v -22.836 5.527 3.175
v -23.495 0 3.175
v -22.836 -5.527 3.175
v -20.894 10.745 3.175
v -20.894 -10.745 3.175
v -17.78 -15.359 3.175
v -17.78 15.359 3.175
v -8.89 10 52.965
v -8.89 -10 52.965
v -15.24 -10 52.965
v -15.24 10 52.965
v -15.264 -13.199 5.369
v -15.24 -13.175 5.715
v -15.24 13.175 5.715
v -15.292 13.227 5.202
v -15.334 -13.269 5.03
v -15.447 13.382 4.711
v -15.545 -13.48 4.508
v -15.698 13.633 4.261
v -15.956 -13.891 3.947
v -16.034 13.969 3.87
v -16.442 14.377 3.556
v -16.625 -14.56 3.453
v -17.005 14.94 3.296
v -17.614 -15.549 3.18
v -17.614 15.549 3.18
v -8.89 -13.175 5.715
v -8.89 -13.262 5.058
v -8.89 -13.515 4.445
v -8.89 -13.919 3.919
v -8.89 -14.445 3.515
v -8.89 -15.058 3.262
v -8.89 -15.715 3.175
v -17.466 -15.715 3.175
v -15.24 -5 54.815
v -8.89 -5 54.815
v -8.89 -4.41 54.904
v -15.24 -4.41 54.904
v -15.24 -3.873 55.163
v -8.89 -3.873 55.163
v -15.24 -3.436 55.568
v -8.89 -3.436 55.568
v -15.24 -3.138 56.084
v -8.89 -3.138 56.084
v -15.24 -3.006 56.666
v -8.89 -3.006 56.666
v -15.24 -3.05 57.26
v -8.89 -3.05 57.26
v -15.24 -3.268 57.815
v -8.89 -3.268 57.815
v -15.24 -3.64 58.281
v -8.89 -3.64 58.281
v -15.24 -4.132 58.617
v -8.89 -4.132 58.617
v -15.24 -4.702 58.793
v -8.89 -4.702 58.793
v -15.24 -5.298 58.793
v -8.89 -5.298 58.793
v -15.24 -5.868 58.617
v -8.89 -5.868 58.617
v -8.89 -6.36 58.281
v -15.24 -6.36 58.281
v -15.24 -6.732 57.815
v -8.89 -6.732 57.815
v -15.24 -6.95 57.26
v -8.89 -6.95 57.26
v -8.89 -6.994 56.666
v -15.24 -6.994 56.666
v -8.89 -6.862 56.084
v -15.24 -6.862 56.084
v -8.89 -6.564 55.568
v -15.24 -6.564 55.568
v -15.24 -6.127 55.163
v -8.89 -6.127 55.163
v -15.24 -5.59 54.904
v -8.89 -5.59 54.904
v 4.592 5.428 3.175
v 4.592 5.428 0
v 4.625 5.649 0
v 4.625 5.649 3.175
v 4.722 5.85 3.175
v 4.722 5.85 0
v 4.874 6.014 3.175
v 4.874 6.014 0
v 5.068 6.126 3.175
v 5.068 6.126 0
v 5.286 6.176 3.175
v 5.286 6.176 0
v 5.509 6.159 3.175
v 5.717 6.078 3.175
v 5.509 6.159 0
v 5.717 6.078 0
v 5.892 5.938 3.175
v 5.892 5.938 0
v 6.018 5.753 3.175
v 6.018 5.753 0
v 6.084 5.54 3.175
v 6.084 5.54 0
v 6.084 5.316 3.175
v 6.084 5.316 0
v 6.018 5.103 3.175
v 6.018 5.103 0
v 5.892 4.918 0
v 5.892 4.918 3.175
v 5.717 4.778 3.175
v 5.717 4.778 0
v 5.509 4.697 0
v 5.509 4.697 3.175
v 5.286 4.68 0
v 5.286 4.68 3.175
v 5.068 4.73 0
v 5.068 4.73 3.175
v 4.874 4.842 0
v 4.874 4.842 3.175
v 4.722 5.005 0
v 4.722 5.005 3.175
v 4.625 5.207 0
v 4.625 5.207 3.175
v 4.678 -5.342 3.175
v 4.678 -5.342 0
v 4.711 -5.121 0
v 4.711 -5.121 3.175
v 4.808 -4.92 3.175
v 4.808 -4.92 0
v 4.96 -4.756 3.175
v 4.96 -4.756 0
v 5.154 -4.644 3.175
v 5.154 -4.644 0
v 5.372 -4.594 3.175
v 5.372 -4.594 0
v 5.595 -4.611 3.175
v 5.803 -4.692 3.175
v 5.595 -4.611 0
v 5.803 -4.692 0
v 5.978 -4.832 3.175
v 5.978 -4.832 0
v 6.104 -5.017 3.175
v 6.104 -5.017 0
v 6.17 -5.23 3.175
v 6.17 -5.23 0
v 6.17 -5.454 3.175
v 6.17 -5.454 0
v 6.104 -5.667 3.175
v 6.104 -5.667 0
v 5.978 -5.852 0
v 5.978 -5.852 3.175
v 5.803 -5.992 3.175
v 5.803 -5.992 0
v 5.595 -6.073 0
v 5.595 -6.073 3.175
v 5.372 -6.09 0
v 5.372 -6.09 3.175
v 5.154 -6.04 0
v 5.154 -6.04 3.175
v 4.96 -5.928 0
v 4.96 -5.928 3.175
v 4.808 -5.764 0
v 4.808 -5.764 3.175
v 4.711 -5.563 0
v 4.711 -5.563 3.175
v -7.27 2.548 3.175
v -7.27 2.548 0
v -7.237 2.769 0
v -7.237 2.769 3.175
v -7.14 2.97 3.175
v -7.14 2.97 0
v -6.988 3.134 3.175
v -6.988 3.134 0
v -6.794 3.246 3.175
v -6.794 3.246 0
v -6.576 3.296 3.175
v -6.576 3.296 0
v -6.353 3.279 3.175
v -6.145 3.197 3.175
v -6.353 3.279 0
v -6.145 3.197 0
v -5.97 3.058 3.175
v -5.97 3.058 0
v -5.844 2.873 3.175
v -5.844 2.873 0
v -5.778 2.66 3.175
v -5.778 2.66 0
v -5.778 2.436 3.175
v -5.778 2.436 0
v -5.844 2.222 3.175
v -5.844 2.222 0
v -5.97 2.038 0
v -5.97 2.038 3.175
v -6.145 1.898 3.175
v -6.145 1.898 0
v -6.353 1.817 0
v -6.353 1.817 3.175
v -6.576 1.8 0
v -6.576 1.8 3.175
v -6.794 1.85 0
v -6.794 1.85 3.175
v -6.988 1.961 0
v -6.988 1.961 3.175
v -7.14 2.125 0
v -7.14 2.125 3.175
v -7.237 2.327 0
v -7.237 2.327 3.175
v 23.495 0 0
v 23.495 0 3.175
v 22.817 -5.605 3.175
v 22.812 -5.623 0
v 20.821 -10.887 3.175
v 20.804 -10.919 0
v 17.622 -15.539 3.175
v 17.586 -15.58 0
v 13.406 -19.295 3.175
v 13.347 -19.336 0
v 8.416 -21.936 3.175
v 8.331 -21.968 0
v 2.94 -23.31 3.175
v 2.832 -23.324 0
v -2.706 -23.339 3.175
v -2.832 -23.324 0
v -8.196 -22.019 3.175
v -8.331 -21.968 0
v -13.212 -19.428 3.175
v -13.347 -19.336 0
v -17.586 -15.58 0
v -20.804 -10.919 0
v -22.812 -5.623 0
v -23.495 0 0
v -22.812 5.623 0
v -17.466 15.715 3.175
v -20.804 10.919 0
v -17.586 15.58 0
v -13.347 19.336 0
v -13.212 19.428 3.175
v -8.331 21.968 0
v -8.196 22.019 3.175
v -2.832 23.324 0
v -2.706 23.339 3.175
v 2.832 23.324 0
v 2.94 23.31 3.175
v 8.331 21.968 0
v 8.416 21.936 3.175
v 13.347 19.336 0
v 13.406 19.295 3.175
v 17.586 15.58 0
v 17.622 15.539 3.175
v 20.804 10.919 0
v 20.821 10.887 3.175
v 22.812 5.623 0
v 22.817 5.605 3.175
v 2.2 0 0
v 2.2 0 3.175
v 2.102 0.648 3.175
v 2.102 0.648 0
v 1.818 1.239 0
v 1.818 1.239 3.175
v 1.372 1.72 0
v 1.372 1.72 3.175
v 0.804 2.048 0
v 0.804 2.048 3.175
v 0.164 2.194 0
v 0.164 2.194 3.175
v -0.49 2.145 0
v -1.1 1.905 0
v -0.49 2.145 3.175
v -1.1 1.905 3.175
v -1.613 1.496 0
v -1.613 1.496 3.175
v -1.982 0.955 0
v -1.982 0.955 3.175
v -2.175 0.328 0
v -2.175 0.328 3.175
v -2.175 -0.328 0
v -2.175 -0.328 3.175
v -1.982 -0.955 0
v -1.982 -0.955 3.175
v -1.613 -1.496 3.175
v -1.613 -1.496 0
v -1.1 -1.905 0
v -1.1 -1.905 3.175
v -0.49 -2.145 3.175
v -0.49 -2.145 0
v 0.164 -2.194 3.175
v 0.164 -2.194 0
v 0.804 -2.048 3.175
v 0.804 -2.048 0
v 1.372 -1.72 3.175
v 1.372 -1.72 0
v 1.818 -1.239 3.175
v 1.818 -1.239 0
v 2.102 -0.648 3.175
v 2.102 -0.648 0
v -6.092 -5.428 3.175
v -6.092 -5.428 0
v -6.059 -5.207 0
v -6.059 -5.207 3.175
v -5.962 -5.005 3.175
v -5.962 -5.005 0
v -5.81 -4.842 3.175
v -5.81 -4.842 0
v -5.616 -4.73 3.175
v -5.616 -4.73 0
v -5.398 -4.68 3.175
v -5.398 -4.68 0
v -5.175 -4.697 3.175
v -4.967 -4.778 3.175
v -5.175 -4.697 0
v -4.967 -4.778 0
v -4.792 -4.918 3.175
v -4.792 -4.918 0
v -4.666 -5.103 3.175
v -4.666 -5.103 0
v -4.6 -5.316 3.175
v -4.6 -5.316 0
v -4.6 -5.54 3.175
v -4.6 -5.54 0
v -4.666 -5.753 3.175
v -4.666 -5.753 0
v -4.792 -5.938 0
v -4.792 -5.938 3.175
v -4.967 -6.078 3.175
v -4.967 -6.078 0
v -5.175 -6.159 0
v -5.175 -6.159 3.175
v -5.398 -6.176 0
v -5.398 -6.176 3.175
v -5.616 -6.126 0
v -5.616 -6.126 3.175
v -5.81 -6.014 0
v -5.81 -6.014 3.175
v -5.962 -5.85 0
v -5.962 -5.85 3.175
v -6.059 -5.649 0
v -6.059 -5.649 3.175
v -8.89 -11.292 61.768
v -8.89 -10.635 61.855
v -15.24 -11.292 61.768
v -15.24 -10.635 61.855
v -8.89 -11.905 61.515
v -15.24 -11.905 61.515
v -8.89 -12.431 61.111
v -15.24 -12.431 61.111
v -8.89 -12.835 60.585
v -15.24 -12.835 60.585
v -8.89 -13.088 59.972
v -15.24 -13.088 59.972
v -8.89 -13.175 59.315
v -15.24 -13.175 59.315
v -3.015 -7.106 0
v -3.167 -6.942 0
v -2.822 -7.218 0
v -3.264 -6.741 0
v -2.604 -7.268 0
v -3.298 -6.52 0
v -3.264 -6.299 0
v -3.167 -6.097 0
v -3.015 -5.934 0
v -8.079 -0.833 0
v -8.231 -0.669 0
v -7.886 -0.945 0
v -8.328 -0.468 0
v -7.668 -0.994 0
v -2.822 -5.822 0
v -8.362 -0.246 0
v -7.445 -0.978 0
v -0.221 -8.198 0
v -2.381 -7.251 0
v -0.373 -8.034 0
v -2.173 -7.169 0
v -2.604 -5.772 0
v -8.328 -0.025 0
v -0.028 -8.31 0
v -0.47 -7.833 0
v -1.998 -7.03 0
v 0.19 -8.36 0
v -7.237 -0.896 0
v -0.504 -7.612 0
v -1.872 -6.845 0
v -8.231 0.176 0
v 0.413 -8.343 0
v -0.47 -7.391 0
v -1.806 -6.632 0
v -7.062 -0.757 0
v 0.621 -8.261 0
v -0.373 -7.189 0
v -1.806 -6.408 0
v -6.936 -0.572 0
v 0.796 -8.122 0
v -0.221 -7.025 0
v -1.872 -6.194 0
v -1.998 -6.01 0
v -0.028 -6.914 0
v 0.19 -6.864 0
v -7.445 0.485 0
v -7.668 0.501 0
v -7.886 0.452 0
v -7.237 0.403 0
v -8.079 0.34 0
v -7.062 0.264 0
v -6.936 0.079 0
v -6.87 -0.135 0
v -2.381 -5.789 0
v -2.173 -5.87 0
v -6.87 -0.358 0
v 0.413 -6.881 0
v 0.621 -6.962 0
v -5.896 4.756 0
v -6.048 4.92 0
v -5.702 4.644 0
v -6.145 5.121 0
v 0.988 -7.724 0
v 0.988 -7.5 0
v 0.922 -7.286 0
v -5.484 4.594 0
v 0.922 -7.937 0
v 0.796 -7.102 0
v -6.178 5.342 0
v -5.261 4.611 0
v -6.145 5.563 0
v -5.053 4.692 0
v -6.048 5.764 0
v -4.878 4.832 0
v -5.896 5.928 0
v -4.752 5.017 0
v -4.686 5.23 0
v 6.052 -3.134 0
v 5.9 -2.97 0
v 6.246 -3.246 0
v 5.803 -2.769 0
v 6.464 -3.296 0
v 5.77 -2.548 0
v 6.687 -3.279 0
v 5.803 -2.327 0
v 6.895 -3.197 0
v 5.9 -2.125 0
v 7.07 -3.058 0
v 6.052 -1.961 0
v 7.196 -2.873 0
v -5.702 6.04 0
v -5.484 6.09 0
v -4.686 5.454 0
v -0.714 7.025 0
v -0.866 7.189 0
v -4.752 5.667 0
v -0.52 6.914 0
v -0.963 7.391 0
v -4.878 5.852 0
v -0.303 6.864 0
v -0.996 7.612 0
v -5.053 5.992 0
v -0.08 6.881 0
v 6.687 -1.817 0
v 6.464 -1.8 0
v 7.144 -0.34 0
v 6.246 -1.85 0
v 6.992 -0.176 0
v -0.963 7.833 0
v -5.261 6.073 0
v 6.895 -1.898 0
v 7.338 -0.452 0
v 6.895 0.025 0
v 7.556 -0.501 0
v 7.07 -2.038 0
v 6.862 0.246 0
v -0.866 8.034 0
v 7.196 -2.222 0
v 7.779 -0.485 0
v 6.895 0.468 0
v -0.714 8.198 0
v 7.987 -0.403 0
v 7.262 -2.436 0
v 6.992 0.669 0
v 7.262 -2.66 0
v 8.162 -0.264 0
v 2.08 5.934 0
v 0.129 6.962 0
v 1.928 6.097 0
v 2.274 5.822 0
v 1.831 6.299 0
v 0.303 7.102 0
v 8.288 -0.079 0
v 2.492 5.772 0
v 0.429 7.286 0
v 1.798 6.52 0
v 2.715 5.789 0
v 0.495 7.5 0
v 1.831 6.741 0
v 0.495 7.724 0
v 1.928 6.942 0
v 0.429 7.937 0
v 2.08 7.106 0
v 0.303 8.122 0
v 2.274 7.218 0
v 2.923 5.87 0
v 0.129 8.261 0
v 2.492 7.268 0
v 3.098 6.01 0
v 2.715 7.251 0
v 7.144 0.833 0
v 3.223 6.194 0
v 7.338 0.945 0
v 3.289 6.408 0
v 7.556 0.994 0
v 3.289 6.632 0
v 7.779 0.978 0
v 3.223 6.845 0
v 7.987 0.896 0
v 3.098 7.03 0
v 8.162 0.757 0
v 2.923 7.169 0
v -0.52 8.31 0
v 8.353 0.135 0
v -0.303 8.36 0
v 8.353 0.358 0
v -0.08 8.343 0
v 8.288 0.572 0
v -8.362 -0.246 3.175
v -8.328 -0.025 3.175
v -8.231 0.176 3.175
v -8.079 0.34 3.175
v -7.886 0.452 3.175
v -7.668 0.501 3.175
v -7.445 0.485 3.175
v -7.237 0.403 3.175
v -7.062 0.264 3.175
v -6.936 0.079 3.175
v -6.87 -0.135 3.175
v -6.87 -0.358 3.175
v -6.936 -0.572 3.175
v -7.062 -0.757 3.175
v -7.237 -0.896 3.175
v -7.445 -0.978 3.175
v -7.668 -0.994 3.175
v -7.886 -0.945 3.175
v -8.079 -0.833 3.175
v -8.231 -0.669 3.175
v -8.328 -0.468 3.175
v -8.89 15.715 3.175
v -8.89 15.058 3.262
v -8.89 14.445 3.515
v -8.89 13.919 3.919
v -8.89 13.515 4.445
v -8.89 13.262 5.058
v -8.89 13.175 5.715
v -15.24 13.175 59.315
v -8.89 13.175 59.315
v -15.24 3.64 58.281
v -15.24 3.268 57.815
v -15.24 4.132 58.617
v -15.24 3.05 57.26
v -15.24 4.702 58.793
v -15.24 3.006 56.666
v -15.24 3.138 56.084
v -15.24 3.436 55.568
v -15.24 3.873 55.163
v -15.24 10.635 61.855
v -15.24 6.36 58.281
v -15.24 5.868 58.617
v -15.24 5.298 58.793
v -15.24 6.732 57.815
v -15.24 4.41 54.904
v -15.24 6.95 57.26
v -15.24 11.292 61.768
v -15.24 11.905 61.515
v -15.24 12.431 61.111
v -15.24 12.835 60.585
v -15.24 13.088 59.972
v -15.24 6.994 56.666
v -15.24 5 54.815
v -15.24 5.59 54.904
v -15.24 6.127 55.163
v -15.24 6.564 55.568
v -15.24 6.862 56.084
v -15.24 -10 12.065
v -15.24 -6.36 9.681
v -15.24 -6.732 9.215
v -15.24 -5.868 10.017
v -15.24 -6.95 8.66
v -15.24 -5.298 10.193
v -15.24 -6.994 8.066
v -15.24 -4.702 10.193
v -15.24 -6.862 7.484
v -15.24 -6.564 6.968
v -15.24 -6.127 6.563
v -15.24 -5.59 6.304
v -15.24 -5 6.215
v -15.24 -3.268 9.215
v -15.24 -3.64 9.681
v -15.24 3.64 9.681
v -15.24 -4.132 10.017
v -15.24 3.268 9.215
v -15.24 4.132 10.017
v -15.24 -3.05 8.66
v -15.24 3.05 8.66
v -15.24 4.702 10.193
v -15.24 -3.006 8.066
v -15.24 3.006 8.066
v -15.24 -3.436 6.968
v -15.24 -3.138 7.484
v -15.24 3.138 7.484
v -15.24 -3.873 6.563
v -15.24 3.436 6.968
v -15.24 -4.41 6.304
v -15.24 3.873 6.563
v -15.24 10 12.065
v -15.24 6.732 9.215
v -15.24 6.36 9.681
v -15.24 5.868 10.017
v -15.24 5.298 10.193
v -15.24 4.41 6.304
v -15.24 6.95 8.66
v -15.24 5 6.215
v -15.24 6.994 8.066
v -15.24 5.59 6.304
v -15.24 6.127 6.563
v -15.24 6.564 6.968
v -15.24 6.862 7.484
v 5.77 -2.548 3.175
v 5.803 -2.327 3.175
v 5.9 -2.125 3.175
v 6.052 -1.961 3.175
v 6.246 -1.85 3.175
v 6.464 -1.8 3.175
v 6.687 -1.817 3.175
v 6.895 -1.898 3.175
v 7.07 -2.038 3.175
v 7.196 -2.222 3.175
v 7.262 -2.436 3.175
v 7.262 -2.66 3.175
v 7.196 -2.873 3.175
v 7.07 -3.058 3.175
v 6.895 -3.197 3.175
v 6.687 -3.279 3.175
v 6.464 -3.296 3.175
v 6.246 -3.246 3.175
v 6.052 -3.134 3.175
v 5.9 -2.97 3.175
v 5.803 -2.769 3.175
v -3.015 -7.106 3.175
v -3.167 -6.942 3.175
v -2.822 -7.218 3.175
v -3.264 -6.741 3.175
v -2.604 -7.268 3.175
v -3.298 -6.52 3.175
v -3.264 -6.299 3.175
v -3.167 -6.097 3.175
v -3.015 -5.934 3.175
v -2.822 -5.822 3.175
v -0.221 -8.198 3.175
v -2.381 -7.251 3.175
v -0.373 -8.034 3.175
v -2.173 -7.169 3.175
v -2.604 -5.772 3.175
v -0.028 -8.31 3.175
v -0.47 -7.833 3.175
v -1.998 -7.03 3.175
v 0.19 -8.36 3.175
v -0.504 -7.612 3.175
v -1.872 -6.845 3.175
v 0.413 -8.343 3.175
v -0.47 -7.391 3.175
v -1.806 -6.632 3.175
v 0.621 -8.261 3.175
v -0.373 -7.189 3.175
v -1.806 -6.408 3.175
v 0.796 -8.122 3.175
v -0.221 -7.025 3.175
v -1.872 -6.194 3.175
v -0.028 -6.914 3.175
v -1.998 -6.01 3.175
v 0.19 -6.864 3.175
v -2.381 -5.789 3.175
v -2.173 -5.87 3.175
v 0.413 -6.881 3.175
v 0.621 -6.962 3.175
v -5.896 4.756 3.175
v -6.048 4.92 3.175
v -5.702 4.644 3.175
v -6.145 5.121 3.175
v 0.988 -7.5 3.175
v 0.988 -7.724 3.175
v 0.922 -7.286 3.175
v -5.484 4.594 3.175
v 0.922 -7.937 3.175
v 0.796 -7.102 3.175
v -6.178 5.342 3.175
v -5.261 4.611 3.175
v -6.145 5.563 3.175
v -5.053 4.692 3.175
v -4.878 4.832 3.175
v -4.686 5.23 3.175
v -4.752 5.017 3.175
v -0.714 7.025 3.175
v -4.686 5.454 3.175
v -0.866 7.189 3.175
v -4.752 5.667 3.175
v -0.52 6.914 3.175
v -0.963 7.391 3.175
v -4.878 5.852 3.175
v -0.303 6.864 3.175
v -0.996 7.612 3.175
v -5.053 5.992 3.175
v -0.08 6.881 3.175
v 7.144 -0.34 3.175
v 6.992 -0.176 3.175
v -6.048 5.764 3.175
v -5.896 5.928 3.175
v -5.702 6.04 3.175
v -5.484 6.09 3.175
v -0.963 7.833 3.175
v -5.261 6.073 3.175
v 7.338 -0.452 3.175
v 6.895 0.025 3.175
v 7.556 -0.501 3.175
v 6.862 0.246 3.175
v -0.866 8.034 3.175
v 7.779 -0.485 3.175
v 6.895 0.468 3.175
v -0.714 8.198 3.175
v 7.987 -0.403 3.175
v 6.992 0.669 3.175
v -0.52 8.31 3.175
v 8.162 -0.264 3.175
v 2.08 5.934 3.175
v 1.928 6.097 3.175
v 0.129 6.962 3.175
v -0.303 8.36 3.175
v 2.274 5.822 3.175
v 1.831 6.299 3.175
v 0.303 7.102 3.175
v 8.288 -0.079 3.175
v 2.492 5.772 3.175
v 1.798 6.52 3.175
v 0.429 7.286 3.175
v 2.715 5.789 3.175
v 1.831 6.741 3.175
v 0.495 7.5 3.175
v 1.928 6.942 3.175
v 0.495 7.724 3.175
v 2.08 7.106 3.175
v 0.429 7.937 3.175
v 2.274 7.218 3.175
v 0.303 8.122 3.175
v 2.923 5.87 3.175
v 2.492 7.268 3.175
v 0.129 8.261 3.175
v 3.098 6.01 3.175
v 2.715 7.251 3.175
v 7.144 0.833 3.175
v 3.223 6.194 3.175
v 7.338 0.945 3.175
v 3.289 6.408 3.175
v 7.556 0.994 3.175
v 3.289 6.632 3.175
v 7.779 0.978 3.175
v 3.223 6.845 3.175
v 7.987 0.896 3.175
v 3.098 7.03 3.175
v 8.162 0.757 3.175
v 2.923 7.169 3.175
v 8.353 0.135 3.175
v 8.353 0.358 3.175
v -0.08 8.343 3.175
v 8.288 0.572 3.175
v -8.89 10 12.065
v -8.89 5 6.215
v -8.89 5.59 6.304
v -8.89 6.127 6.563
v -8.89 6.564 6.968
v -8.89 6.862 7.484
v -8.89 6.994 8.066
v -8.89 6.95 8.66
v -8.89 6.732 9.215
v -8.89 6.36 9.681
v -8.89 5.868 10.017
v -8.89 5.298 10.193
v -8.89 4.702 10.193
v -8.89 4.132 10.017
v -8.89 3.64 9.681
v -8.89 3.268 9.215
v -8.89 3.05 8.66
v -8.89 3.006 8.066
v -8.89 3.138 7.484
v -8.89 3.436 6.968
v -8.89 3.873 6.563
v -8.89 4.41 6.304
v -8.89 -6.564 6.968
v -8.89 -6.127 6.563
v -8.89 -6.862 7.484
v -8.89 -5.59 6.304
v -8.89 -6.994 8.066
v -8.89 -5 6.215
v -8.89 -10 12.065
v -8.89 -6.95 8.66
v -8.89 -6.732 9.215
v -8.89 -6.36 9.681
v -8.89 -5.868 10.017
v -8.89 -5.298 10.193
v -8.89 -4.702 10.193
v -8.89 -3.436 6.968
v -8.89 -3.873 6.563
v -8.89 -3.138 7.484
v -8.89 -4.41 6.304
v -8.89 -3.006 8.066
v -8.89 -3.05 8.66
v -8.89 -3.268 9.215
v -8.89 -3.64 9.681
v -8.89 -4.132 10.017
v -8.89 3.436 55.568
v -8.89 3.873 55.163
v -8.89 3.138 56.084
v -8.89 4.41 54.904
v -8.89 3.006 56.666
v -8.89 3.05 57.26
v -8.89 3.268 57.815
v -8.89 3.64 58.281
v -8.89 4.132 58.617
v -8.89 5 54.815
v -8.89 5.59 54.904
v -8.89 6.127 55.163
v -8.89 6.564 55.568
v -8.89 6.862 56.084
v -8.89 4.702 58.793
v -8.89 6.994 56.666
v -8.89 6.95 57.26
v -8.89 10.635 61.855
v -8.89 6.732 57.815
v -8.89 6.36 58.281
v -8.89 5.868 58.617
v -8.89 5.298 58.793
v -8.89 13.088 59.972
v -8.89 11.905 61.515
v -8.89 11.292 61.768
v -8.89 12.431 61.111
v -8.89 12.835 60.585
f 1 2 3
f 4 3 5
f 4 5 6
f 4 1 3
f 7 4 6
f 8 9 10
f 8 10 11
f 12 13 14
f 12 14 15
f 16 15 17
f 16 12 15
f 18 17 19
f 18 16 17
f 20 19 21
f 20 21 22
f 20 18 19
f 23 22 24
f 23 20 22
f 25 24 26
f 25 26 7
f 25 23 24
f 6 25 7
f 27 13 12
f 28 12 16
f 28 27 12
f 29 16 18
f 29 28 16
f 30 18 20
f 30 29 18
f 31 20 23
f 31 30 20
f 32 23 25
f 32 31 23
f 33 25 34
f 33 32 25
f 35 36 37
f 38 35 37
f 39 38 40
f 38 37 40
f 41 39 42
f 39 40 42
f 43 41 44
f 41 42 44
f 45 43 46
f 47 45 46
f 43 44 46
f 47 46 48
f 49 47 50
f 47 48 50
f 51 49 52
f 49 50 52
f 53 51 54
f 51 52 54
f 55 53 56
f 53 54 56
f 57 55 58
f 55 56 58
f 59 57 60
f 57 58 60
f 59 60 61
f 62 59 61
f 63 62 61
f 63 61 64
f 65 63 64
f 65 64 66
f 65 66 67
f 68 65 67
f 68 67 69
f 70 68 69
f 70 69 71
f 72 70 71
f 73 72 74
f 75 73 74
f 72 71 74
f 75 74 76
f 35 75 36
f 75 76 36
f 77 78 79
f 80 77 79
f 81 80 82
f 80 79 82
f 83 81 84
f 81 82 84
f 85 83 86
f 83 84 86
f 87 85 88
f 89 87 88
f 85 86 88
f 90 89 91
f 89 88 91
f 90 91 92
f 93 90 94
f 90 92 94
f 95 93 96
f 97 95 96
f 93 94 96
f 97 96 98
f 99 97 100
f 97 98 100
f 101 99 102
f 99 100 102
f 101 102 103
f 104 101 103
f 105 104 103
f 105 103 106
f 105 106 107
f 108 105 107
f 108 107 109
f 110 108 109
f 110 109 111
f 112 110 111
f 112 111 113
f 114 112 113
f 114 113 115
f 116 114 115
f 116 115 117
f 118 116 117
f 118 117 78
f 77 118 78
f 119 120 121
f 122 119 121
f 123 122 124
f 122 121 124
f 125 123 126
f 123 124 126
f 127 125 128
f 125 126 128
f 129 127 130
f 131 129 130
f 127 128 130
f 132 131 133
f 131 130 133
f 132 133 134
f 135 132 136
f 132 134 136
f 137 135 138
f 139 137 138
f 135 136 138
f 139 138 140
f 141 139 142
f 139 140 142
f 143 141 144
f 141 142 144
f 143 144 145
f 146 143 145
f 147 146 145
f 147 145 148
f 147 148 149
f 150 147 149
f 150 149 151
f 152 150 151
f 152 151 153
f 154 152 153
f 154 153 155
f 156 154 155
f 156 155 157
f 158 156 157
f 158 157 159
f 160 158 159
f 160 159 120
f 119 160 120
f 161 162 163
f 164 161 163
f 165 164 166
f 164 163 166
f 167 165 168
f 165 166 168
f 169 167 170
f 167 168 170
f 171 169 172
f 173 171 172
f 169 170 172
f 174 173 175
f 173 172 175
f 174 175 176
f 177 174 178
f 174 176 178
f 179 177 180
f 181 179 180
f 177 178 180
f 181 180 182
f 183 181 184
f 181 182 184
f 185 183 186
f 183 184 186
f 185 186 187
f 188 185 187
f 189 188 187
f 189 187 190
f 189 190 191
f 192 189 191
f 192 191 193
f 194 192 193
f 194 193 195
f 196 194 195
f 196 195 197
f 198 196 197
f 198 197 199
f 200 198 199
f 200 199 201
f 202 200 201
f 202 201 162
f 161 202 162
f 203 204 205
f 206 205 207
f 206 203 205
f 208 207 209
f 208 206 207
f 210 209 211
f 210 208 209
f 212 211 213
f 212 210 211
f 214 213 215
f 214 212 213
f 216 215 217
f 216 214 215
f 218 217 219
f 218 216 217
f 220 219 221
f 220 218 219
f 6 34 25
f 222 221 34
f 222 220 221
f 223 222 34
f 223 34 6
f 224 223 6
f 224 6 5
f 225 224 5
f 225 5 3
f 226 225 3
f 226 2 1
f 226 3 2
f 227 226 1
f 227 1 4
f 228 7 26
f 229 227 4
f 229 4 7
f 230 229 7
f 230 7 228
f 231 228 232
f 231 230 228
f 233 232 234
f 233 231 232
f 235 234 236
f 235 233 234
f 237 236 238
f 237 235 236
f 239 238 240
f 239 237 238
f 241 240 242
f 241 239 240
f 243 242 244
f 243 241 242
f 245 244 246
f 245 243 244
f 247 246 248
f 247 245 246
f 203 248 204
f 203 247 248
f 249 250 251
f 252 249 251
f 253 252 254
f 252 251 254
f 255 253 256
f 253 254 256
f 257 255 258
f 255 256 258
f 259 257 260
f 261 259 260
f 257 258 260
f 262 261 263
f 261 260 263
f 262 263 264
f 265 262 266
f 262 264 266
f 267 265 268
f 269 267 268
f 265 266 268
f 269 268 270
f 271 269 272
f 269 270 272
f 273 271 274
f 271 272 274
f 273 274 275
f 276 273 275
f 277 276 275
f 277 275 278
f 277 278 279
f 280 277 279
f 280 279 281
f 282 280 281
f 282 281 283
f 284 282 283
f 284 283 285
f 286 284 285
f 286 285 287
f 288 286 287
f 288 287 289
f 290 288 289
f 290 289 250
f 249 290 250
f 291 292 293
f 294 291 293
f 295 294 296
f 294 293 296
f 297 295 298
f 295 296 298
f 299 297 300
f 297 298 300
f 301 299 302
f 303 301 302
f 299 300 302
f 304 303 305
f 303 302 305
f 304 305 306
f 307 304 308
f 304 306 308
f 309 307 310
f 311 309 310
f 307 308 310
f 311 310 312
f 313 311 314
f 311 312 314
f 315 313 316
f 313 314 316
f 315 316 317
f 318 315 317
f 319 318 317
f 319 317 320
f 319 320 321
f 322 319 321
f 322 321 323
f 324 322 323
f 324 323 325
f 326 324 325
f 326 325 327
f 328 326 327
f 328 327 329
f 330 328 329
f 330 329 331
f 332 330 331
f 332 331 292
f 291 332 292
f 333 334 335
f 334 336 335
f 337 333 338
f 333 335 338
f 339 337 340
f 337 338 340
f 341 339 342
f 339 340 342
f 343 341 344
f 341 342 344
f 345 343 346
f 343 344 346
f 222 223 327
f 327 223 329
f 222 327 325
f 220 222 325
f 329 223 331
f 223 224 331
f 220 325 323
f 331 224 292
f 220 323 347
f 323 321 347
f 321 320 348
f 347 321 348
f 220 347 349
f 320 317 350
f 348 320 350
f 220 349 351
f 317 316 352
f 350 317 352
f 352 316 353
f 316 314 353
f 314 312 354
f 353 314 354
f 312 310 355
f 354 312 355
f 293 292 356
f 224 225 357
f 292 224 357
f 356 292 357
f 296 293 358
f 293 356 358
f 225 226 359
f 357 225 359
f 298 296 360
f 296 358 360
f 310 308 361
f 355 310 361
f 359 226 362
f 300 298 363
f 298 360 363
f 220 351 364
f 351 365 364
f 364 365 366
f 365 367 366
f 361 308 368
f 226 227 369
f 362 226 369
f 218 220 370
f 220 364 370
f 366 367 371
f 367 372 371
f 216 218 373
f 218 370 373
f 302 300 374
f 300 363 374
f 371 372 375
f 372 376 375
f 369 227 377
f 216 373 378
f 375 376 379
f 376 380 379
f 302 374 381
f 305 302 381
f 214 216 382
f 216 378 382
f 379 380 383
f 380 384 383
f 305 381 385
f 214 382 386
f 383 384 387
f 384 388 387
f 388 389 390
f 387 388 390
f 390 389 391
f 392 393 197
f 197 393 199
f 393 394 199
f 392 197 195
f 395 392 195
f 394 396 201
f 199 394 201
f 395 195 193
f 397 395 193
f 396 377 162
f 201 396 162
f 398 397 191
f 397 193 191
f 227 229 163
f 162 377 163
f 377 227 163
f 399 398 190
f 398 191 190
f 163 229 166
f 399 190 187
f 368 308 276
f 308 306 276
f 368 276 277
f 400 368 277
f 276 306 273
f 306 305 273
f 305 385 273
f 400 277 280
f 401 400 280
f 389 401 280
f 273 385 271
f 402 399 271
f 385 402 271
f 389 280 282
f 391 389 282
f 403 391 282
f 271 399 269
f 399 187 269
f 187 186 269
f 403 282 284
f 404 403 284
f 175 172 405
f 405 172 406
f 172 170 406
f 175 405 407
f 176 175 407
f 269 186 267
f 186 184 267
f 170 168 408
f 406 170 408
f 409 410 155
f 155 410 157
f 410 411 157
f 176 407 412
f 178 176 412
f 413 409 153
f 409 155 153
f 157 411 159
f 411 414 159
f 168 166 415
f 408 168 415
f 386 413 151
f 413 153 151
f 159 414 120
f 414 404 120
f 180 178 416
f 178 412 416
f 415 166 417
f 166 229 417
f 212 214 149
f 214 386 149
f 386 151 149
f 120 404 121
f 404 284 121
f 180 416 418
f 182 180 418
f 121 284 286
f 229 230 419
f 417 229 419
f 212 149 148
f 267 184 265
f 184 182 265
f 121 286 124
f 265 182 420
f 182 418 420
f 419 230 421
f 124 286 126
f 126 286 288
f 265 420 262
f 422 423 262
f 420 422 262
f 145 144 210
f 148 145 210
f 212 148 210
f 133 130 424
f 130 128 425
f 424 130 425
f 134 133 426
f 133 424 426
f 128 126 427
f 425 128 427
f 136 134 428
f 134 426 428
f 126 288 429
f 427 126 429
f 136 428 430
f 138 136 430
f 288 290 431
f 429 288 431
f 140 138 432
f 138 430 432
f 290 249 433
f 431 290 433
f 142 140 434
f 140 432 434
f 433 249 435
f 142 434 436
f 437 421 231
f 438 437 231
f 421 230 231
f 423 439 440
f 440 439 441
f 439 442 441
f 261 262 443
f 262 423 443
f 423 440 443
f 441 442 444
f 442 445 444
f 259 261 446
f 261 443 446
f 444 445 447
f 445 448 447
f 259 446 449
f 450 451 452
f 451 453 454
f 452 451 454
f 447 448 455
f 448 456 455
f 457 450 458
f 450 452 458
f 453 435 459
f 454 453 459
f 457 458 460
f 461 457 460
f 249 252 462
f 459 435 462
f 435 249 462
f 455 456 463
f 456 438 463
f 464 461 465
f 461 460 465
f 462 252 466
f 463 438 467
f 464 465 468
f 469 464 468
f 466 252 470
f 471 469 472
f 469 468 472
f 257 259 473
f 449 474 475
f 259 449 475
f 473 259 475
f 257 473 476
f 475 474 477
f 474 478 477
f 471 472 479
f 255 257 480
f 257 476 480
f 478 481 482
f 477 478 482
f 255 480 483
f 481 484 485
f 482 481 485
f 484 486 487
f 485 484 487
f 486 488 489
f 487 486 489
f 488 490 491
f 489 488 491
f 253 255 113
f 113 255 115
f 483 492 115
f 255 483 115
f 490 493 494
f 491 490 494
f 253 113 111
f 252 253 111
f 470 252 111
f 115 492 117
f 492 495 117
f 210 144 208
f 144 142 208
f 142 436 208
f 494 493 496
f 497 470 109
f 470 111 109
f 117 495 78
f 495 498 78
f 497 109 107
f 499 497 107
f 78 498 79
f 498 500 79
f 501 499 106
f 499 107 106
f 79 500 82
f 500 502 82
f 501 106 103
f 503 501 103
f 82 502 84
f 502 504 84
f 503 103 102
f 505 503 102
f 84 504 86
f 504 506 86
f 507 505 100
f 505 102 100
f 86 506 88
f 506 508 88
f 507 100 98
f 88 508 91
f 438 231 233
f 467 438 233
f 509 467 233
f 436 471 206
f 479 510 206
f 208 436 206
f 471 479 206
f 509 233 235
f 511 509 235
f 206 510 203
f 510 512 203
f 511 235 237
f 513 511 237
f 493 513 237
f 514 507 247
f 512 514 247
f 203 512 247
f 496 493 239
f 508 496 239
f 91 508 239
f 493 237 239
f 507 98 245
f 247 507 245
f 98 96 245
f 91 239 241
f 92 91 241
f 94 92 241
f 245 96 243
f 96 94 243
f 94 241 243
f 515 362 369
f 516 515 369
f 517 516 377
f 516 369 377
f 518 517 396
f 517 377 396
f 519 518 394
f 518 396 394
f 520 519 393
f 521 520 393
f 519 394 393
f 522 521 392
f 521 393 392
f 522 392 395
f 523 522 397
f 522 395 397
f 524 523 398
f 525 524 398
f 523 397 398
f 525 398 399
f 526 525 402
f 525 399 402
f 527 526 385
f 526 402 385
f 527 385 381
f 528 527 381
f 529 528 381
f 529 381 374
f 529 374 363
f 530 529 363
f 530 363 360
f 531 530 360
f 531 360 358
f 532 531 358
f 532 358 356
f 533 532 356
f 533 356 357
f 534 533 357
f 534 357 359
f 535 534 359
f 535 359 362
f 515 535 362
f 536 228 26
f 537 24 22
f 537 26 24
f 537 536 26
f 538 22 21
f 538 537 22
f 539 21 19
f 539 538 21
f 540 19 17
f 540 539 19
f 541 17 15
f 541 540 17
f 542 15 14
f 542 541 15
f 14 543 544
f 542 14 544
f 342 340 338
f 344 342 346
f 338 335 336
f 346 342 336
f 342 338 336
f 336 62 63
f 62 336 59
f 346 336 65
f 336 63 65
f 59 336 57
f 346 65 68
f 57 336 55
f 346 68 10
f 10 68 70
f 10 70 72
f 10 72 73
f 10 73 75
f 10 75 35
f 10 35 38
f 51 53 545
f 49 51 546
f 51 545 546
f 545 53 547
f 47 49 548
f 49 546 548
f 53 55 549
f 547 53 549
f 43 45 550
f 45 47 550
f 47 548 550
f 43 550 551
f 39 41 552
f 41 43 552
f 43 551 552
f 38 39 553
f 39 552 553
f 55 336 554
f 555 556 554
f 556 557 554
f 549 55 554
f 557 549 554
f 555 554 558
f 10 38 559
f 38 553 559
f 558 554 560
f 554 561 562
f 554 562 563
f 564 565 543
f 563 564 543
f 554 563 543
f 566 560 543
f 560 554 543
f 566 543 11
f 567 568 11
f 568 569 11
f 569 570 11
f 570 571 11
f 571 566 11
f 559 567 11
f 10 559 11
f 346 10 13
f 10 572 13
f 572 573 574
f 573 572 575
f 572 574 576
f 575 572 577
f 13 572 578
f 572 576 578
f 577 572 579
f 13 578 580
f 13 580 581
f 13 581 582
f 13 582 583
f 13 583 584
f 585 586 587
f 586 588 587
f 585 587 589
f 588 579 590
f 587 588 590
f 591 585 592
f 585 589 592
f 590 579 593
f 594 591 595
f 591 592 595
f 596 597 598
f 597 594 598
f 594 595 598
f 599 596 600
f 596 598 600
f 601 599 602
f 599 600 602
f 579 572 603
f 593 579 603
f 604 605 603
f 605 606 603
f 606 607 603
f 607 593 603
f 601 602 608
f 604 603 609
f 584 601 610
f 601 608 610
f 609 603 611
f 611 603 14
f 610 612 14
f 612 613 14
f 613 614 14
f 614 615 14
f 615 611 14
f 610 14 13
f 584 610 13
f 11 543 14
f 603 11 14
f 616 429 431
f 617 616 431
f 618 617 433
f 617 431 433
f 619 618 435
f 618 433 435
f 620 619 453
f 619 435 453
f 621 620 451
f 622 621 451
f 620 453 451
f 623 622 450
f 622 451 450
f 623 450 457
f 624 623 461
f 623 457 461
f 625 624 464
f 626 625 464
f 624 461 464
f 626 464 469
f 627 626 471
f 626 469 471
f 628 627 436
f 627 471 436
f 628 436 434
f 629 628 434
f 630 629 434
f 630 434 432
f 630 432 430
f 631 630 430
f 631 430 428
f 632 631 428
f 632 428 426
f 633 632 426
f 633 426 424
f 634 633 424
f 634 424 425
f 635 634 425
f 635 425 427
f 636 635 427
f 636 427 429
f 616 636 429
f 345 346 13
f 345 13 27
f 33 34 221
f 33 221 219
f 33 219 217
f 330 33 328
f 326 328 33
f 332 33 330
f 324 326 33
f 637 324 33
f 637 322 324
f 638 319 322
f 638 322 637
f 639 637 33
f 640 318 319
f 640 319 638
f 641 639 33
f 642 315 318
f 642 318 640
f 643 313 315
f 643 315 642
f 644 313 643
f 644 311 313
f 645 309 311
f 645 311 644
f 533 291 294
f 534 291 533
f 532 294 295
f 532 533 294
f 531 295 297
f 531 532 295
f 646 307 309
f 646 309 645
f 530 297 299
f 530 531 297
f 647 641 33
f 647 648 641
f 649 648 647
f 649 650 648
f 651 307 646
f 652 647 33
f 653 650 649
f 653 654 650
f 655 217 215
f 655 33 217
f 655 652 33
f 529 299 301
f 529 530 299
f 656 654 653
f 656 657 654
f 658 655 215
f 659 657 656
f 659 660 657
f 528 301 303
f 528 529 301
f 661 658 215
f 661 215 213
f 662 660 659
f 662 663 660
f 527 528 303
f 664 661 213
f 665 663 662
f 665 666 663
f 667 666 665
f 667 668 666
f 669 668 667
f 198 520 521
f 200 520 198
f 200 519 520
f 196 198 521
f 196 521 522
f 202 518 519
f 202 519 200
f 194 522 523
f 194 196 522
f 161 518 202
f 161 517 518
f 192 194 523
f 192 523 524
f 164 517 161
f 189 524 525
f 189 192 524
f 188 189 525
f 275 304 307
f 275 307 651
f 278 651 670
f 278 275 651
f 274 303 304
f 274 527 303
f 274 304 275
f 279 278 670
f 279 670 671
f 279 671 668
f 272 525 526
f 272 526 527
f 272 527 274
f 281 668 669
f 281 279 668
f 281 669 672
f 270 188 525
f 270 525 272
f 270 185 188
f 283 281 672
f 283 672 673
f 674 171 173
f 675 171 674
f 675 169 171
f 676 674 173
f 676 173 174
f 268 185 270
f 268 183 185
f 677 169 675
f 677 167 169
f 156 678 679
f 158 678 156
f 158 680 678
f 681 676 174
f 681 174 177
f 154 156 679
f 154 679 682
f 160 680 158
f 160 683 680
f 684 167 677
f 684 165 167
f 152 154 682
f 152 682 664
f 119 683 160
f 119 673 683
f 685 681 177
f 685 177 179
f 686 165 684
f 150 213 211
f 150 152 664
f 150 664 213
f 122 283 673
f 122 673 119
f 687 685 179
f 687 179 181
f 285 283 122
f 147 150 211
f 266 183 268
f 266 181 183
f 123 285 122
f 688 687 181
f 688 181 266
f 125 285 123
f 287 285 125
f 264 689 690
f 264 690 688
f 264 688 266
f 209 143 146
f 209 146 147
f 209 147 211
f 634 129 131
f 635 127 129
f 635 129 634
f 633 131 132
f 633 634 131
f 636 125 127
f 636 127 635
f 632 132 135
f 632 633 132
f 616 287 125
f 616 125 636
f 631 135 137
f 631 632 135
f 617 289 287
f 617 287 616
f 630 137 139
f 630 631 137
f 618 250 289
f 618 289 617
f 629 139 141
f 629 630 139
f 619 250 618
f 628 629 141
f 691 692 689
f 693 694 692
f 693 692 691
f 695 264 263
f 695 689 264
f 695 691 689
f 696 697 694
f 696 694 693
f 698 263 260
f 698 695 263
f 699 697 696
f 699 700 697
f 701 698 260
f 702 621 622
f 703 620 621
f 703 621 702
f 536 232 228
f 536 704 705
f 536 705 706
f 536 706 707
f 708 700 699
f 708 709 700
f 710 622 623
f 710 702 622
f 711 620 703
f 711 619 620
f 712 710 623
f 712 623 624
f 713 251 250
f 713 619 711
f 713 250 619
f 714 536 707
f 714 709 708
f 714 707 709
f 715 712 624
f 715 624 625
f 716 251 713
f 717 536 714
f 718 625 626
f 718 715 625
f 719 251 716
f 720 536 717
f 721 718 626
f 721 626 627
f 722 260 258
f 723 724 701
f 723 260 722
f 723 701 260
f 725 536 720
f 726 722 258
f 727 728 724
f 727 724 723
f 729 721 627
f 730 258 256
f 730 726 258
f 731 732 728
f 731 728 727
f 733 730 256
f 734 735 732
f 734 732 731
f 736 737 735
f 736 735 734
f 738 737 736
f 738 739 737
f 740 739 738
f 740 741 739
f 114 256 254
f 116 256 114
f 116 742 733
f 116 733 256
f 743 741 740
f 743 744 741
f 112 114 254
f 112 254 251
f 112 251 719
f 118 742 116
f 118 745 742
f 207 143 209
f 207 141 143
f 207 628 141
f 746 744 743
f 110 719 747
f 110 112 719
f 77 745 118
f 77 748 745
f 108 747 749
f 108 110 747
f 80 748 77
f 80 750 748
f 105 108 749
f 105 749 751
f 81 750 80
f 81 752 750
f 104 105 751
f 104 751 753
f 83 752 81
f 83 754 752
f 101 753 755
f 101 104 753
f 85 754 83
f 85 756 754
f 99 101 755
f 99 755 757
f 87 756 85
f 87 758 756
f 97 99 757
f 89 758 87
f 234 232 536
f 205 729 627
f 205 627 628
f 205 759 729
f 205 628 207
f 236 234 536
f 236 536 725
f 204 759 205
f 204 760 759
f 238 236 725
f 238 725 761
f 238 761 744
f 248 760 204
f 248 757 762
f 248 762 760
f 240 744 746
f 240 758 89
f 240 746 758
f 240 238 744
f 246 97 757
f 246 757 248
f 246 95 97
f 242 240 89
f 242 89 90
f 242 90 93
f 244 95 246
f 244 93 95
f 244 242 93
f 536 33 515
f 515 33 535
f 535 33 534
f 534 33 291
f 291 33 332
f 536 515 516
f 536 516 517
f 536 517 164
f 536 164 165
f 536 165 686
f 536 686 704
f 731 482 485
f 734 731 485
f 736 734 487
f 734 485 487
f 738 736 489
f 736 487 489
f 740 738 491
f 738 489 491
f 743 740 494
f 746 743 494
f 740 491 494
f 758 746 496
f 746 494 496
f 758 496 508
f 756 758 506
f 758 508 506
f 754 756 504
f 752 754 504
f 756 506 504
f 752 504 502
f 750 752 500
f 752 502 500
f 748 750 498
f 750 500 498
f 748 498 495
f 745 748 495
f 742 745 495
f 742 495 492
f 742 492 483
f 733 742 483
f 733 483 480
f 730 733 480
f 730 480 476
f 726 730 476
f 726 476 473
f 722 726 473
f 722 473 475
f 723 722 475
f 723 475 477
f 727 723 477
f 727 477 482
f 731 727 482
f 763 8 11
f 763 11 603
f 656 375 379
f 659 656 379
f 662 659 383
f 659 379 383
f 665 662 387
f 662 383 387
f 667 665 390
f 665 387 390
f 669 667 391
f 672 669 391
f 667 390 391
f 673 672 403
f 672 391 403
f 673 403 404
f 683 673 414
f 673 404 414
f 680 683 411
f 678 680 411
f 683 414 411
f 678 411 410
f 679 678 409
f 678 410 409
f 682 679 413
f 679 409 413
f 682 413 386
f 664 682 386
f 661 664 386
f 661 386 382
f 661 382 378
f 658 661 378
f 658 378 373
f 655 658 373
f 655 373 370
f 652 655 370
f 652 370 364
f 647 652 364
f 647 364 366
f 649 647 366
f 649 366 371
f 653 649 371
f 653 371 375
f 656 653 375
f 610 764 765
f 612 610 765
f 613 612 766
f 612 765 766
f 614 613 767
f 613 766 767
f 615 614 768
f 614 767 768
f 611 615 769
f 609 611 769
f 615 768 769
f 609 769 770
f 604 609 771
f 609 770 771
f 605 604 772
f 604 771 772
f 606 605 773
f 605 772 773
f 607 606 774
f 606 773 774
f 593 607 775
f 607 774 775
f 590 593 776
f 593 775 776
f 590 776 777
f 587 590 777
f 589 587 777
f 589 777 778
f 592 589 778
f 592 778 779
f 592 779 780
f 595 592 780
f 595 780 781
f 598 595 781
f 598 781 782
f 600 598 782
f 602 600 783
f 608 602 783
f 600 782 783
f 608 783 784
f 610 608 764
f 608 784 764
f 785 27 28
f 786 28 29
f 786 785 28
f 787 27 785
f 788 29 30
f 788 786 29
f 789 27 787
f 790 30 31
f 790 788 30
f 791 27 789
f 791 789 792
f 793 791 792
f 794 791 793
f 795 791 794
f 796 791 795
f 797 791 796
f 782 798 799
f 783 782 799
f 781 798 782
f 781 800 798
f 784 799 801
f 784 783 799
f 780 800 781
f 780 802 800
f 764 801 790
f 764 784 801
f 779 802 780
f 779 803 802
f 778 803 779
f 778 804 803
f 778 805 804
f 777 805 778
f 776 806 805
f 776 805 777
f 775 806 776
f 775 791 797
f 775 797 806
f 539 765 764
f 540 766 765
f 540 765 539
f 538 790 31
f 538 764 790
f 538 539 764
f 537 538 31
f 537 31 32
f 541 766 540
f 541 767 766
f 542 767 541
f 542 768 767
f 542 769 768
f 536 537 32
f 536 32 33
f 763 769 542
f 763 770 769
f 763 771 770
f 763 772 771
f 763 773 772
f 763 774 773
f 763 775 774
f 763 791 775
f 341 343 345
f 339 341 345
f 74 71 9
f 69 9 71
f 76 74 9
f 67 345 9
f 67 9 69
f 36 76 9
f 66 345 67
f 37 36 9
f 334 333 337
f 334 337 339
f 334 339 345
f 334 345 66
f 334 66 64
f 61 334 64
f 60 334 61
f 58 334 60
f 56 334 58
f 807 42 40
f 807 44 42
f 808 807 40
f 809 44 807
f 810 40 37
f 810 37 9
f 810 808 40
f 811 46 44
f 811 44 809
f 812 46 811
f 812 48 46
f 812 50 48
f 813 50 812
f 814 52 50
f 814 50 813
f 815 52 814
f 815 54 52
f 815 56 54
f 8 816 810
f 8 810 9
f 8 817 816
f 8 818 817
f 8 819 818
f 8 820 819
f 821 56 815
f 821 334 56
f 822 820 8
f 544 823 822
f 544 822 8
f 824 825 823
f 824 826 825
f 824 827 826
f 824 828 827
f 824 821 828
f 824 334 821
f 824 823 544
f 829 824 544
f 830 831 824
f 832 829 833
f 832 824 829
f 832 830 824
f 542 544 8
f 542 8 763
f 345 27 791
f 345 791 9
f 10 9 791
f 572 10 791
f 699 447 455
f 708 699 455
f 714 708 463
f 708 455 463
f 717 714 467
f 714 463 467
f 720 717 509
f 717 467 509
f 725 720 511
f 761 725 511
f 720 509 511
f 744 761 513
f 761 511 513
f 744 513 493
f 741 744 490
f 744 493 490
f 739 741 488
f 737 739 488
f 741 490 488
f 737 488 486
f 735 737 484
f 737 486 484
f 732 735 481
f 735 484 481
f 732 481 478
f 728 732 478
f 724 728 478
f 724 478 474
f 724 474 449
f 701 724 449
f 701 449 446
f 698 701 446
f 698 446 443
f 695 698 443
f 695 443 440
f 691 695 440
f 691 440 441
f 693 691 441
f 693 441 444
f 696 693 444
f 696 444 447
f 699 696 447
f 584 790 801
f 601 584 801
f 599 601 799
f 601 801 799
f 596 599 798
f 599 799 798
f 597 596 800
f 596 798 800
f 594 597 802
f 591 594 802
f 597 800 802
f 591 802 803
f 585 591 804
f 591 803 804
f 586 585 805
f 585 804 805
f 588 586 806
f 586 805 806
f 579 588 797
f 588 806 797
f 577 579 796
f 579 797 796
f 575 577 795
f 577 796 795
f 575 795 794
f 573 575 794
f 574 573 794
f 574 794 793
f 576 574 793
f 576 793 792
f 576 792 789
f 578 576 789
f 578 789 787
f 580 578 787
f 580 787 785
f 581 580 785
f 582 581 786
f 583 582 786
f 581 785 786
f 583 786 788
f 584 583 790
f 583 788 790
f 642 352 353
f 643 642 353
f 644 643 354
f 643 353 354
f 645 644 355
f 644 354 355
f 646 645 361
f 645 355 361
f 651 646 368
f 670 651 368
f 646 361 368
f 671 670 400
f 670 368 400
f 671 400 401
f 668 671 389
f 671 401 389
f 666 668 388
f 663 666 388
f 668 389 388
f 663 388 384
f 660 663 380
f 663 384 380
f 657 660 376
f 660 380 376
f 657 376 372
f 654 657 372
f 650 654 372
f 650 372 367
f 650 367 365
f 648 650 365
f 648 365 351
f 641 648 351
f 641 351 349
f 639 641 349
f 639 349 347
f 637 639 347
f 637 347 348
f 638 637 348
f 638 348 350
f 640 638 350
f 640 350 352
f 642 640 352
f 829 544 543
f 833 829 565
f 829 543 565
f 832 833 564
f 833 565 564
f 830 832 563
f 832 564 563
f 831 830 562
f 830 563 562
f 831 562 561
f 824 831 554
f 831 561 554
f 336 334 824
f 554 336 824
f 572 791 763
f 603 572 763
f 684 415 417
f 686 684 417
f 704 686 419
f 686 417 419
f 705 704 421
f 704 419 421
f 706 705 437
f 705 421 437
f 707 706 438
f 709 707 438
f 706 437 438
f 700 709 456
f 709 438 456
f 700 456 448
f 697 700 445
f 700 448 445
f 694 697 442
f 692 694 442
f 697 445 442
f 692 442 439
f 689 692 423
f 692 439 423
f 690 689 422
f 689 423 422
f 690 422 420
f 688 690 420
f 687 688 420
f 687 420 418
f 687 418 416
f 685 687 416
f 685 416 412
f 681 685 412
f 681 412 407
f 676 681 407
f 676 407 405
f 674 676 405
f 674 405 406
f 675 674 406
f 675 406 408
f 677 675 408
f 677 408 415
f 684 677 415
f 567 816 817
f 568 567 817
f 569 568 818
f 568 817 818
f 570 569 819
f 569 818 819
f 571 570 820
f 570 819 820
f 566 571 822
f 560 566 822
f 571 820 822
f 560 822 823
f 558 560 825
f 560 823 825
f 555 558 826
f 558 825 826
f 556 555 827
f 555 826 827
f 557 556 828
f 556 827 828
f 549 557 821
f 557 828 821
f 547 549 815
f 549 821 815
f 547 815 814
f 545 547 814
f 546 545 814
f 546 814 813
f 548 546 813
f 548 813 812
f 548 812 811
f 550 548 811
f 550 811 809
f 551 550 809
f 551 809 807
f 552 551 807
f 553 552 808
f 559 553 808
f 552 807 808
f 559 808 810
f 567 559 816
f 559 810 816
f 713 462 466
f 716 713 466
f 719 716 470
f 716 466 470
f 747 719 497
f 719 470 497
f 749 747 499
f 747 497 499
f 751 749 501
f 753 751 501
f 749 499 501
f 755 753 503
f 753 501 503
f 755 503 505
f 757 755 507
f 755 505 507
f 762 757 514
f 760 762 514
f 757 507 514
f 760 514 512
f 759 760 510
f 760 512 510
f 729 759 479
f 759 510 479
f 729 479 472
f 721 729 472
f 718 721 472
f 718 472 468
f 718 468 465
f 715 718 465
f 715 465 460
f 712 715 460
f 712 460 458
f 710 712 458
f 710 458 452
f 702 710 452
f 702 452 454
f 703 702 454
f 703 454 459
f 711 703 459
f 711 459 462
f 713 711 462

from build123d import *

# Parameters (mm, degrees)
SKETCH1_R           = 23.495
BOSS_EXTRUDE1_DEPTH = 3.175
SKETCH4_W           = 58.68
SKETCH4_H           = 26.35
SKETCH4_R           = 2
SKETCH4_W_2         = 40.9
SKETCH4_H_2         = 20
BOSS_EXTRUDE3_DEPTH = 6.35
FILLET1_R           = 2.54
CUT_EXTRUDE1_REACH  = 72.214
SKETCH5_R           = 0.75
SKETCH5_R_2         = 1.5
SKETCH6_R           = 2.2
CUT_EXTRUDE2_DEPTH  = 68.434208377
FILLET2_R           = 2.54


with BuildPart() as part:
    # Sketch1 → Boss-Extrude1 (new body)
    with BuildSketch(Plane.XY):
        Circle(SKETCH1_R)
    extrude(amount=BOSS_EXTRUDE1_DEPTH)

    # Sketch4 → Boss-Extrude3 (add)
    with BuildSketch(Plane(origin=(-8.89, 0, 0), x_dir=(0, 0, -1), z_dir=(1, 0, 0))):
        with Locations((-32.515, 0)):
            Rectangle(SKETCH4_W, SKETCH4_H)
        with Locations((-56.815, -5)):
            Circle(SKETCH4_R, mode=Mode.SUBTRACT)
        with Locations((-56.815, 5)):
            Circle(SKETCH4_R, mode=Mode.SUBTRACT)
        with Locations((-8.215, -5)):
            Circle(SKETCH4_R, mode=Mode.SUBTRACT)
        with Locations((-8.215, 5)):
            Circle(SKETCH4_R, mode=Mode.SUBTRACT)
        with Locations((-32.515, 0)):
            Rectangle(SKETCH4_W_2, SKETCH4_H_2, mode=Mode.SUBTRACT)
    extrude(amount=-BOSS_EXTRUDE3_DEPTH)

    # Fillet1
    # the kernel refuses this fillet: 2.54 mm, written as the material it adds along each edge
    with BuildSketch(Plane(origin=(-15.24, -13.175, 3.175), x_dir=(-1, 0, 0), z_dir=(0, 1, 0))) as fillet1_piece_1:
        with BuildLine():
            CenterArc((FILLET1_R, FILLET1_R), FILLET1_R, 180, 90)
            Line((0, FILLET1_R), (0, 0))
            Line((0, 0), (FILLET1_R, 0))
        make_face()
    extrude(amount=26.35)
    with BuildSketch(Plane(origin=(-8.89, 13.175, 3.175), x_dir=(0, 1, 0), z_dir=(-1, 0, 0))) as fillet1_piece_2:
        with BuildLine():
            CenterArc((FILLET1_R, -FILLET1_R), FILLET1_R, 90, 90)
            Line((0, -FILLET1_R), (0, 0))
            Line((0, 0), (FILLET1_R, 0))
        make_face()
    extrude(amount=6.35)
    with BuildSketch(Plane(origin=(-8.89, -13.175, 3.175), x_dir=(0, -1, 0), z_dir=(-1, 0, 0))) as fillet1_piece_3:
        with BuildLine():
            CenterArc((FILLET1_R, FILLET1_R), FILLET1_R, 180, 90)
            Line((0, FILLET1_R), (0, 0))
            Line((0, 0), (FILLET1_R, 0))
        make_face()
    extrude(amount=6.35)
    with BuildSketch(Plane(origin=(-15.24, -19.525, 3.175), x_dir=(-1, 0, 0), z_dir=(0, 1, 0))) as fillet1_piece_4a_section:
        with BuildLine():
            CenterArc((FILLET1_R, FILLET1_R), FILLET1_R, 180, 90)
            Line((0, FILLET1_R), (0, 0))
            Line((0, 0), (FILLET1_R, 0))
        make_face()
    fillet1_piece_4a = extrude(amount=32.7, mode=Mode.PRIVATE)
    fillet1_piece_4a = fillet1_piece_4a & Plane(origin=(0, 0, 3.789458471), x_dir=(1, 0, 0), z_dir=(0, 0, -1)) * Cylinder(23.495, 76, mode=Mode.PRIVATE)
    fillet1_piece_4a = split(fillet1_piece_4a, bisect_by=Plane(origin=(-15.747234341, -13.175, 3.789458471), z_dir=(0, -1, 0)), keep=Keep.TOP, mode=Mode.PRIVATE)
    with BuildSketch(Plane(origin=(-8.89, -13.175, 3.175), x_dir=(0, -1, 0), z_dir=(-1, 0, 0))) as fillet1_piece_4b_section:
        with BuildLine():
            CenterArc((FILLET1_R, FILLET1_R), FILLET1_R, 180, 90)
            Line((0, FILLET1_R), (0, 0))
            Line((0, 0), (FILLET1_R, 0))
        make_face()
    fillet1_piece_4b = extrude(amount=12.7, mode=Mode.PRIVATE)
    fillet1_piece_4b = fillet1_piece_4b & Plane(origin=(0, 0, 3.784403855), x_dir=(1, 0, 0), z_dir=(0, 0, -1)) * Cylinder(23.495, 36, mode=Mode.PRIVATE)
    fillet1_piece_4b = split(fillet1_piece_4b, bisect_by=Plane(origin=(-15.24, -13.690986617, 3.784403855), z_dir=(-1, 0, 0)), keep=Keep.TOP, mode=Mode.PRIVATE)
    fillet1_piece_4 = fillet1_piece_4a & fillet1_piece_4b
    add(fillet1_piece_4)
    with BuildSketch(Plane(origin=(-8.89, 13.175, 3.175), x_dir=(0, 1, 0), z_dir=(-1, 0, 0))) as fillet1_piece_5a_section:
        with BuildLine():
            CenterArc((FILLET1_R, -FILLET1_R), FILLET1_R, 90, 90)
            Line((0, -FILLET1_R), (0, 0))
            Line((0, 0), (FILLET1_R, 0))
        make_face()
    fillet1_piece_5a = extrude(amount=12.7, mode=Mode.PRIVATE)
    fillet1_piece_5a = fillet1_piece_5a & Plane(origin=(0, 0, 3.784403835), x_dir=(1, 0, 0), z_dir=(0, 0, -1)) * Cylinder(23.495, 36, mode=Mode.PRIVATE)
    fillet1_piece_5a = split(fillet1_piece_5a, bisect_by=Plane(origin=(-15.24, 13.69098675, 3.784403835), z_dir=(-1, 0, 0)), keep=Keep.TOP, mode=Mode.PRIVATE)
    with BuildSketch(Plane(origin=(-15.24, -13.175, 3.175), x_dir=(-1, 0, 0), z_dir=(0, 1, 0))) as fillet1_piece_5b_section:
        with BuildLine():
            CenterArc((FILLET1_R, FILLET1_R), FILLET1_R, 180, 90)
            Line((0, FILLET1_R), (0, 0))
            Line((0, 0), (FILLET1_R, 0))
        make_face()
    fillet1_piece_5b = extrude(amount=32.7, mode=Mode.PRIVATE)
    fillet1_piece_5b = fillet1_piece_5b & Plane(origin=(0, 0, 3.789458493), x_dir=(1, 0, 0), z_dir=(0, 0, -1)) * Cylinder(23.495, 76, mode=Mode.PRIVATE)
    fillet1_piece_5b = split(fillet1_piece_5b, bisect_by=Plane(origin=(-15.747234214, 13.175, 3.789458493), z_dir=(0, 1, 0)), keep=Keep.TOP, mode=Mode.PRIVATE)
    fillet1_piece_5 = fillet1_piece_5a & fillet1_piece_5b
    add(fillet1_piece_5)

    # Sketch5 → Cut-Extrude1 (cut, up to next)
    with BuildSketch(Plane(origin=(0, 0, 0), x_dir=(-1, 0, 0), z_dir=(0, 0, -1)), mode=Mode.PRIVATE) as cut_extrude1_sk1:
        with Locations((5.342004985, -5.427981461)):
            Circle(SKETCH5_R)
    cut_extrude1_tool1 = extrude(cut_extrude1_sk1.sketch, amount=-CUT_EXTRUDE1_REACH, mode=Mode.PRIVATE) & part.part
    # Sketch5 → Cut-Extrude1 (cut, up to next)
    with BuildSketch(Plane(origin=(0, 0, 0), x_dir=(-1, 0, 0), z_dir=(0, 0, -1)), mode=Mode.PRIVATE) as cut_extrude1_sk2:
        with Locations((2.547769545, -6.519882694)):
            Circle(SKETCH5_R)
    cut_extrude1_tool2 = extrude(cut_extrude1_sk2.sketch, amount=-CUT_EXTRUDE1_REACH, mode=Mode.PRIVATE) & part.part
    # Sketch5 → Cut-Extrude1 (cut, up to next)
    with BuildSketch(Plane(origin=(0, 0, 0), x_dir=(-1, 0, 0), z_dir=(0, 0, -1)), mode=Mode.PRIVATE) as cut_extrude1_sk3:
        with Locations((-0.246465895, -7.611783928)):
            Circle(SKETCH5_R)
    cut_extrude1_tool3 = extrude(cut_extrude1_sk3.sketch, amount=-CUT_EXTRUDE1_REACH, mode=Mode.PRIVATE) & part.part
    # Sketch5 → Cut-Extrude1 (cut, up to next)
    with BuildSketch(Plane(origin=(0, 0, 0), x_dir=(-1, 0, 0), z_dir=(0, 0, -1)), mode=Mode.PRIVATE) as cut_extrude1_sk4:
        with Locations((-5.427981461, -5.342004985)):
            Circle(SKETCH5_R)
    cut_extrude1_tool4 = extrude(cut_extrude1_sk4.sketch, amount=-CUT_EXTRUDE1_REACH, mode=Mode.PRIVATE) & part.part
    # Sketch5 → Cut-Extrude1 (cut, up to next)
    with BuildSketch(Plane(origin=(0, 0, 0), x_dir=(-1, 0, 0), z_dir=(0, 0, -1)), mode=Mode.PRIVATE) as cut_extrude1_sk5:
        with Locations((-6.519882694, -2.547769545)):
            Circle(SKETCH5_R)
    cut_extrude1_tool5 = extrude(cut_extrude1_sk5.sketch, amount=-CUT_EXTRUDE1_REACH, mode=Mode.PRIVATE) & part.part
    # Sketch5 → Cut-Extrude1 (cut, up to next)
    with BuildSketch(Plane(origin=(0, 0, 0), x_dir=(-1, 0, 0), z_dir=(0, 0, -1)), mode=Mode.PRIVATE) as cut_extrude1_sk6:
        with Locations((-7.611783928, 0.246465895)):
            Circle(SKETCH5_R)
    cut_extrude1_tool6 = extrude(cut_extrude1_sk6.sketch, amount=-CUT_EXTRUDE1_REACH, mode=Mode.PRIVATE) & part.part
    # Sketch5 → Cut-Extrude1 (cut, up to next)
    with BuildSketch(Plane(origin=(0, 0, 0), x_dir=(-1, 0, 0), z_dir=(0, 0, -1)), mode=Mode.PRIVATE) as cut_extrude1_sk7:
        with Locations((-5.342004985, 5.427981461)):
            Circle(SKETCH5_R)
    cut_extrude1_tool7 = extrude(cut_extrude1_sk7.sketch, amount=-CUT_EXTRUDE1_REACH, mode=Mode.PRIVATE) & part.part
    # Sketch5 → Cut-Extrude1 (cut, up to next)
    with BuildSketch(Plane(origin=(0, 0, 0), x_dir=(-1, 0, 0), z_dir=(0, 0, -1)), mode=Mode.PRIVATE) as cut_extrude1_sk8:
        with Locations((-2.547769545, 6.519882694)):
            Circle(SKETCH5_R)
    cut_extrude1_tool8 = extrude(cut_extrude1_sk8.sketch, amount=-CUT_EXTRUDE1_REACH, mode=Mode.PRIVATE) & part.part
    # Sketch5 → Cut-Extrude1 (cut, up to next)
    with BuildSketch(Plane(origin=(0, 0, 0), x_dir=(-1, 0, 0), z_dir=(0, 0, -1)), mode=Mode.PRIVATE) as cut_extrude1_sk9:
        with Locations((0.246465895, 7.611783928)):
            Circle(SKETCH5_R)
    cut_extrude1_tool9 = extrude(cut_extrude1_sk9.sketch, amount=-CUT_EXTRUDE1_REACH, mode=Mode.PRIVATE) & part.part
    # Sketch5 → Cut-Extrude1 (cut, up to next)
    with BuildSketch(Plane(origin=(0, 0, 0), x_dir=(-1, 0, 0), z_dir=(0, 0, -1)), mode=Mode.PRIVATE) as cut_extrude1_sk10:
        with Locations((5.427981461, 5.342004985)):
            Circle(SKETCH5_R)
    cut_extrude1_tool10 = extrude(cut_extrude1_sk10.sketch, amount=-CUT_EXTRUDE1_REACH, mode=Mode.PRIVATE) & part.part
    # Sketch5 → Cut-Extrude1 (cut, up to next)
    with BuildSketch(Plane(origin=(0, 0, 0), x_dir=(-1, 0, 0), z_dir=(0, 0, -1)), mode=Mode.PRIVATE) as cut_extrude1_sk11:
        with Locations((6.519882694, 2.547769545)):
            Circle(SKETCH5_R)
    cut_extrude1_tool11 = extrude(cut_extrude1_sk11.sketch, amount=-CUT_EXTRUDE1_REACH, mode=Mode.PRIVATE) & part.part
    # Sketch5 → Cut-Extrude1 (cut, up to next)
    with BuildSketch(Plane(origin=(0, 0, 0), x_dir=(-1, 0, 0), z_dir=(0, 0, -1)), mode=Mode.PRIVATE) as cut_extrude1_sk12:
        with Locations((7.611783928, -0.246465895)):
            Circle(SKETCH5_R)
    cut_extrude1_tool12 = extrude(cut_extrude1_sk12.sketch, amount=-CUT_EXTRUDE1_REACH, mode=Mode.PRIVATE) & part.part
    # Sketch5 → Cut-Extrude1 (cut, up to next)
    with BuildSketch(Plane(origin=(0, 0, 0), x_dir=(-1, 0, 0), z_dir=(0, 0, -1)), mode=Mode.PRIVATE) as cut_extrude1_sk13:
        Circle(SKETCH5_R_2)
    cut_extrude1_tool13 = extrude(cut_extrude1_sk13.sketch, amount=-CUT_EXTRUDE1_REACH, mode=Mode.PRIVATE) & part.part
    add(cut_extrude1_tool1.solids().sort_by_distance((-5.342005, -5.427981, 0))[0], mode=Mode.SUBTRACT)
    add(cut_extrude1_tool2.solids().sort_by_distance((-2.54777, -6.519883, 0))[0], mode=Mode.SUBTRACT)
    add(cut_extrude1_tool3.solids().sort_by_distance((0.246466, -7.611784, 0))[0], mode=Mode.SUBTRACT)
    add(cut_extrude1_tool4.solids().sort_by_distance((5.427981, -5.342005, 0))[0], mode=Mode.SUBTRACT)
    add(cut_extrude1_tool5.solids().sort_by_distance((6.519883, -2.54777, 0))[0], mode=Mode.SUBTRACT)
    add(cut_extrude1_tool6.solids().sort_by_distance((7.611784, 0.246466, 0))[0], mode=Mode.SUBTRACT)
    add(cut_extrude1_tool7.solids().sort_by_distance((5.342005, 5.427981, 0))[0], mode=Mode.SUBTRACT)
    add(cut_extrude1_tool8.solids().sort_by_distance((2.54777, 6.519883, 0))[0], mode=Mode.SUBTRACT)
    add(cut_extrude1_tool9.solids().sort_by_distance((-0.246466, 7.611784, 0))[0], mode=Mode.SUBTRACT)
    add(cut_extrude1_tool10.solids().sort_by_distance((-5.427981, 5.342005, 0))[0], mode=Mode.SUBTRACT)
    add(cut_extrude1_tool11.solids().sort_by_distance((-6.519883, 2.54777, 0))[0], mode=Mode.SUBTRACT)
    add(cut_extrude1_tool12.solids().sort_by_distance((-7.611784, -0.246466, 0))[0], mode=Mode.SUBTRACT)
    add(cut_extrude1_tool13.solids().sort_by_distance((0, 0, 0))[0], mode=Mode.SUBTRACT)

    # Sketch6 → Cut-Extrude2 (cut, through all)
    with BuildSketch(Plane.XY.offset(3.175)):
        Circle(SKETCH6_R)
    extrude(amount=-CUT_EXTRUDE2_DEPTH, mode=Mode.SUBTRACT)

    # Fillet2
    fillet2_edges = [part.edges().sort_by_distance(p)[0] for p in [
        (-12.065, -13.175, 61.855),
        (-12.065, 13.175, 61.855),
    ]]
    fillet(fillet2_edges, radius=FILLET2_R)


solid = part.part
